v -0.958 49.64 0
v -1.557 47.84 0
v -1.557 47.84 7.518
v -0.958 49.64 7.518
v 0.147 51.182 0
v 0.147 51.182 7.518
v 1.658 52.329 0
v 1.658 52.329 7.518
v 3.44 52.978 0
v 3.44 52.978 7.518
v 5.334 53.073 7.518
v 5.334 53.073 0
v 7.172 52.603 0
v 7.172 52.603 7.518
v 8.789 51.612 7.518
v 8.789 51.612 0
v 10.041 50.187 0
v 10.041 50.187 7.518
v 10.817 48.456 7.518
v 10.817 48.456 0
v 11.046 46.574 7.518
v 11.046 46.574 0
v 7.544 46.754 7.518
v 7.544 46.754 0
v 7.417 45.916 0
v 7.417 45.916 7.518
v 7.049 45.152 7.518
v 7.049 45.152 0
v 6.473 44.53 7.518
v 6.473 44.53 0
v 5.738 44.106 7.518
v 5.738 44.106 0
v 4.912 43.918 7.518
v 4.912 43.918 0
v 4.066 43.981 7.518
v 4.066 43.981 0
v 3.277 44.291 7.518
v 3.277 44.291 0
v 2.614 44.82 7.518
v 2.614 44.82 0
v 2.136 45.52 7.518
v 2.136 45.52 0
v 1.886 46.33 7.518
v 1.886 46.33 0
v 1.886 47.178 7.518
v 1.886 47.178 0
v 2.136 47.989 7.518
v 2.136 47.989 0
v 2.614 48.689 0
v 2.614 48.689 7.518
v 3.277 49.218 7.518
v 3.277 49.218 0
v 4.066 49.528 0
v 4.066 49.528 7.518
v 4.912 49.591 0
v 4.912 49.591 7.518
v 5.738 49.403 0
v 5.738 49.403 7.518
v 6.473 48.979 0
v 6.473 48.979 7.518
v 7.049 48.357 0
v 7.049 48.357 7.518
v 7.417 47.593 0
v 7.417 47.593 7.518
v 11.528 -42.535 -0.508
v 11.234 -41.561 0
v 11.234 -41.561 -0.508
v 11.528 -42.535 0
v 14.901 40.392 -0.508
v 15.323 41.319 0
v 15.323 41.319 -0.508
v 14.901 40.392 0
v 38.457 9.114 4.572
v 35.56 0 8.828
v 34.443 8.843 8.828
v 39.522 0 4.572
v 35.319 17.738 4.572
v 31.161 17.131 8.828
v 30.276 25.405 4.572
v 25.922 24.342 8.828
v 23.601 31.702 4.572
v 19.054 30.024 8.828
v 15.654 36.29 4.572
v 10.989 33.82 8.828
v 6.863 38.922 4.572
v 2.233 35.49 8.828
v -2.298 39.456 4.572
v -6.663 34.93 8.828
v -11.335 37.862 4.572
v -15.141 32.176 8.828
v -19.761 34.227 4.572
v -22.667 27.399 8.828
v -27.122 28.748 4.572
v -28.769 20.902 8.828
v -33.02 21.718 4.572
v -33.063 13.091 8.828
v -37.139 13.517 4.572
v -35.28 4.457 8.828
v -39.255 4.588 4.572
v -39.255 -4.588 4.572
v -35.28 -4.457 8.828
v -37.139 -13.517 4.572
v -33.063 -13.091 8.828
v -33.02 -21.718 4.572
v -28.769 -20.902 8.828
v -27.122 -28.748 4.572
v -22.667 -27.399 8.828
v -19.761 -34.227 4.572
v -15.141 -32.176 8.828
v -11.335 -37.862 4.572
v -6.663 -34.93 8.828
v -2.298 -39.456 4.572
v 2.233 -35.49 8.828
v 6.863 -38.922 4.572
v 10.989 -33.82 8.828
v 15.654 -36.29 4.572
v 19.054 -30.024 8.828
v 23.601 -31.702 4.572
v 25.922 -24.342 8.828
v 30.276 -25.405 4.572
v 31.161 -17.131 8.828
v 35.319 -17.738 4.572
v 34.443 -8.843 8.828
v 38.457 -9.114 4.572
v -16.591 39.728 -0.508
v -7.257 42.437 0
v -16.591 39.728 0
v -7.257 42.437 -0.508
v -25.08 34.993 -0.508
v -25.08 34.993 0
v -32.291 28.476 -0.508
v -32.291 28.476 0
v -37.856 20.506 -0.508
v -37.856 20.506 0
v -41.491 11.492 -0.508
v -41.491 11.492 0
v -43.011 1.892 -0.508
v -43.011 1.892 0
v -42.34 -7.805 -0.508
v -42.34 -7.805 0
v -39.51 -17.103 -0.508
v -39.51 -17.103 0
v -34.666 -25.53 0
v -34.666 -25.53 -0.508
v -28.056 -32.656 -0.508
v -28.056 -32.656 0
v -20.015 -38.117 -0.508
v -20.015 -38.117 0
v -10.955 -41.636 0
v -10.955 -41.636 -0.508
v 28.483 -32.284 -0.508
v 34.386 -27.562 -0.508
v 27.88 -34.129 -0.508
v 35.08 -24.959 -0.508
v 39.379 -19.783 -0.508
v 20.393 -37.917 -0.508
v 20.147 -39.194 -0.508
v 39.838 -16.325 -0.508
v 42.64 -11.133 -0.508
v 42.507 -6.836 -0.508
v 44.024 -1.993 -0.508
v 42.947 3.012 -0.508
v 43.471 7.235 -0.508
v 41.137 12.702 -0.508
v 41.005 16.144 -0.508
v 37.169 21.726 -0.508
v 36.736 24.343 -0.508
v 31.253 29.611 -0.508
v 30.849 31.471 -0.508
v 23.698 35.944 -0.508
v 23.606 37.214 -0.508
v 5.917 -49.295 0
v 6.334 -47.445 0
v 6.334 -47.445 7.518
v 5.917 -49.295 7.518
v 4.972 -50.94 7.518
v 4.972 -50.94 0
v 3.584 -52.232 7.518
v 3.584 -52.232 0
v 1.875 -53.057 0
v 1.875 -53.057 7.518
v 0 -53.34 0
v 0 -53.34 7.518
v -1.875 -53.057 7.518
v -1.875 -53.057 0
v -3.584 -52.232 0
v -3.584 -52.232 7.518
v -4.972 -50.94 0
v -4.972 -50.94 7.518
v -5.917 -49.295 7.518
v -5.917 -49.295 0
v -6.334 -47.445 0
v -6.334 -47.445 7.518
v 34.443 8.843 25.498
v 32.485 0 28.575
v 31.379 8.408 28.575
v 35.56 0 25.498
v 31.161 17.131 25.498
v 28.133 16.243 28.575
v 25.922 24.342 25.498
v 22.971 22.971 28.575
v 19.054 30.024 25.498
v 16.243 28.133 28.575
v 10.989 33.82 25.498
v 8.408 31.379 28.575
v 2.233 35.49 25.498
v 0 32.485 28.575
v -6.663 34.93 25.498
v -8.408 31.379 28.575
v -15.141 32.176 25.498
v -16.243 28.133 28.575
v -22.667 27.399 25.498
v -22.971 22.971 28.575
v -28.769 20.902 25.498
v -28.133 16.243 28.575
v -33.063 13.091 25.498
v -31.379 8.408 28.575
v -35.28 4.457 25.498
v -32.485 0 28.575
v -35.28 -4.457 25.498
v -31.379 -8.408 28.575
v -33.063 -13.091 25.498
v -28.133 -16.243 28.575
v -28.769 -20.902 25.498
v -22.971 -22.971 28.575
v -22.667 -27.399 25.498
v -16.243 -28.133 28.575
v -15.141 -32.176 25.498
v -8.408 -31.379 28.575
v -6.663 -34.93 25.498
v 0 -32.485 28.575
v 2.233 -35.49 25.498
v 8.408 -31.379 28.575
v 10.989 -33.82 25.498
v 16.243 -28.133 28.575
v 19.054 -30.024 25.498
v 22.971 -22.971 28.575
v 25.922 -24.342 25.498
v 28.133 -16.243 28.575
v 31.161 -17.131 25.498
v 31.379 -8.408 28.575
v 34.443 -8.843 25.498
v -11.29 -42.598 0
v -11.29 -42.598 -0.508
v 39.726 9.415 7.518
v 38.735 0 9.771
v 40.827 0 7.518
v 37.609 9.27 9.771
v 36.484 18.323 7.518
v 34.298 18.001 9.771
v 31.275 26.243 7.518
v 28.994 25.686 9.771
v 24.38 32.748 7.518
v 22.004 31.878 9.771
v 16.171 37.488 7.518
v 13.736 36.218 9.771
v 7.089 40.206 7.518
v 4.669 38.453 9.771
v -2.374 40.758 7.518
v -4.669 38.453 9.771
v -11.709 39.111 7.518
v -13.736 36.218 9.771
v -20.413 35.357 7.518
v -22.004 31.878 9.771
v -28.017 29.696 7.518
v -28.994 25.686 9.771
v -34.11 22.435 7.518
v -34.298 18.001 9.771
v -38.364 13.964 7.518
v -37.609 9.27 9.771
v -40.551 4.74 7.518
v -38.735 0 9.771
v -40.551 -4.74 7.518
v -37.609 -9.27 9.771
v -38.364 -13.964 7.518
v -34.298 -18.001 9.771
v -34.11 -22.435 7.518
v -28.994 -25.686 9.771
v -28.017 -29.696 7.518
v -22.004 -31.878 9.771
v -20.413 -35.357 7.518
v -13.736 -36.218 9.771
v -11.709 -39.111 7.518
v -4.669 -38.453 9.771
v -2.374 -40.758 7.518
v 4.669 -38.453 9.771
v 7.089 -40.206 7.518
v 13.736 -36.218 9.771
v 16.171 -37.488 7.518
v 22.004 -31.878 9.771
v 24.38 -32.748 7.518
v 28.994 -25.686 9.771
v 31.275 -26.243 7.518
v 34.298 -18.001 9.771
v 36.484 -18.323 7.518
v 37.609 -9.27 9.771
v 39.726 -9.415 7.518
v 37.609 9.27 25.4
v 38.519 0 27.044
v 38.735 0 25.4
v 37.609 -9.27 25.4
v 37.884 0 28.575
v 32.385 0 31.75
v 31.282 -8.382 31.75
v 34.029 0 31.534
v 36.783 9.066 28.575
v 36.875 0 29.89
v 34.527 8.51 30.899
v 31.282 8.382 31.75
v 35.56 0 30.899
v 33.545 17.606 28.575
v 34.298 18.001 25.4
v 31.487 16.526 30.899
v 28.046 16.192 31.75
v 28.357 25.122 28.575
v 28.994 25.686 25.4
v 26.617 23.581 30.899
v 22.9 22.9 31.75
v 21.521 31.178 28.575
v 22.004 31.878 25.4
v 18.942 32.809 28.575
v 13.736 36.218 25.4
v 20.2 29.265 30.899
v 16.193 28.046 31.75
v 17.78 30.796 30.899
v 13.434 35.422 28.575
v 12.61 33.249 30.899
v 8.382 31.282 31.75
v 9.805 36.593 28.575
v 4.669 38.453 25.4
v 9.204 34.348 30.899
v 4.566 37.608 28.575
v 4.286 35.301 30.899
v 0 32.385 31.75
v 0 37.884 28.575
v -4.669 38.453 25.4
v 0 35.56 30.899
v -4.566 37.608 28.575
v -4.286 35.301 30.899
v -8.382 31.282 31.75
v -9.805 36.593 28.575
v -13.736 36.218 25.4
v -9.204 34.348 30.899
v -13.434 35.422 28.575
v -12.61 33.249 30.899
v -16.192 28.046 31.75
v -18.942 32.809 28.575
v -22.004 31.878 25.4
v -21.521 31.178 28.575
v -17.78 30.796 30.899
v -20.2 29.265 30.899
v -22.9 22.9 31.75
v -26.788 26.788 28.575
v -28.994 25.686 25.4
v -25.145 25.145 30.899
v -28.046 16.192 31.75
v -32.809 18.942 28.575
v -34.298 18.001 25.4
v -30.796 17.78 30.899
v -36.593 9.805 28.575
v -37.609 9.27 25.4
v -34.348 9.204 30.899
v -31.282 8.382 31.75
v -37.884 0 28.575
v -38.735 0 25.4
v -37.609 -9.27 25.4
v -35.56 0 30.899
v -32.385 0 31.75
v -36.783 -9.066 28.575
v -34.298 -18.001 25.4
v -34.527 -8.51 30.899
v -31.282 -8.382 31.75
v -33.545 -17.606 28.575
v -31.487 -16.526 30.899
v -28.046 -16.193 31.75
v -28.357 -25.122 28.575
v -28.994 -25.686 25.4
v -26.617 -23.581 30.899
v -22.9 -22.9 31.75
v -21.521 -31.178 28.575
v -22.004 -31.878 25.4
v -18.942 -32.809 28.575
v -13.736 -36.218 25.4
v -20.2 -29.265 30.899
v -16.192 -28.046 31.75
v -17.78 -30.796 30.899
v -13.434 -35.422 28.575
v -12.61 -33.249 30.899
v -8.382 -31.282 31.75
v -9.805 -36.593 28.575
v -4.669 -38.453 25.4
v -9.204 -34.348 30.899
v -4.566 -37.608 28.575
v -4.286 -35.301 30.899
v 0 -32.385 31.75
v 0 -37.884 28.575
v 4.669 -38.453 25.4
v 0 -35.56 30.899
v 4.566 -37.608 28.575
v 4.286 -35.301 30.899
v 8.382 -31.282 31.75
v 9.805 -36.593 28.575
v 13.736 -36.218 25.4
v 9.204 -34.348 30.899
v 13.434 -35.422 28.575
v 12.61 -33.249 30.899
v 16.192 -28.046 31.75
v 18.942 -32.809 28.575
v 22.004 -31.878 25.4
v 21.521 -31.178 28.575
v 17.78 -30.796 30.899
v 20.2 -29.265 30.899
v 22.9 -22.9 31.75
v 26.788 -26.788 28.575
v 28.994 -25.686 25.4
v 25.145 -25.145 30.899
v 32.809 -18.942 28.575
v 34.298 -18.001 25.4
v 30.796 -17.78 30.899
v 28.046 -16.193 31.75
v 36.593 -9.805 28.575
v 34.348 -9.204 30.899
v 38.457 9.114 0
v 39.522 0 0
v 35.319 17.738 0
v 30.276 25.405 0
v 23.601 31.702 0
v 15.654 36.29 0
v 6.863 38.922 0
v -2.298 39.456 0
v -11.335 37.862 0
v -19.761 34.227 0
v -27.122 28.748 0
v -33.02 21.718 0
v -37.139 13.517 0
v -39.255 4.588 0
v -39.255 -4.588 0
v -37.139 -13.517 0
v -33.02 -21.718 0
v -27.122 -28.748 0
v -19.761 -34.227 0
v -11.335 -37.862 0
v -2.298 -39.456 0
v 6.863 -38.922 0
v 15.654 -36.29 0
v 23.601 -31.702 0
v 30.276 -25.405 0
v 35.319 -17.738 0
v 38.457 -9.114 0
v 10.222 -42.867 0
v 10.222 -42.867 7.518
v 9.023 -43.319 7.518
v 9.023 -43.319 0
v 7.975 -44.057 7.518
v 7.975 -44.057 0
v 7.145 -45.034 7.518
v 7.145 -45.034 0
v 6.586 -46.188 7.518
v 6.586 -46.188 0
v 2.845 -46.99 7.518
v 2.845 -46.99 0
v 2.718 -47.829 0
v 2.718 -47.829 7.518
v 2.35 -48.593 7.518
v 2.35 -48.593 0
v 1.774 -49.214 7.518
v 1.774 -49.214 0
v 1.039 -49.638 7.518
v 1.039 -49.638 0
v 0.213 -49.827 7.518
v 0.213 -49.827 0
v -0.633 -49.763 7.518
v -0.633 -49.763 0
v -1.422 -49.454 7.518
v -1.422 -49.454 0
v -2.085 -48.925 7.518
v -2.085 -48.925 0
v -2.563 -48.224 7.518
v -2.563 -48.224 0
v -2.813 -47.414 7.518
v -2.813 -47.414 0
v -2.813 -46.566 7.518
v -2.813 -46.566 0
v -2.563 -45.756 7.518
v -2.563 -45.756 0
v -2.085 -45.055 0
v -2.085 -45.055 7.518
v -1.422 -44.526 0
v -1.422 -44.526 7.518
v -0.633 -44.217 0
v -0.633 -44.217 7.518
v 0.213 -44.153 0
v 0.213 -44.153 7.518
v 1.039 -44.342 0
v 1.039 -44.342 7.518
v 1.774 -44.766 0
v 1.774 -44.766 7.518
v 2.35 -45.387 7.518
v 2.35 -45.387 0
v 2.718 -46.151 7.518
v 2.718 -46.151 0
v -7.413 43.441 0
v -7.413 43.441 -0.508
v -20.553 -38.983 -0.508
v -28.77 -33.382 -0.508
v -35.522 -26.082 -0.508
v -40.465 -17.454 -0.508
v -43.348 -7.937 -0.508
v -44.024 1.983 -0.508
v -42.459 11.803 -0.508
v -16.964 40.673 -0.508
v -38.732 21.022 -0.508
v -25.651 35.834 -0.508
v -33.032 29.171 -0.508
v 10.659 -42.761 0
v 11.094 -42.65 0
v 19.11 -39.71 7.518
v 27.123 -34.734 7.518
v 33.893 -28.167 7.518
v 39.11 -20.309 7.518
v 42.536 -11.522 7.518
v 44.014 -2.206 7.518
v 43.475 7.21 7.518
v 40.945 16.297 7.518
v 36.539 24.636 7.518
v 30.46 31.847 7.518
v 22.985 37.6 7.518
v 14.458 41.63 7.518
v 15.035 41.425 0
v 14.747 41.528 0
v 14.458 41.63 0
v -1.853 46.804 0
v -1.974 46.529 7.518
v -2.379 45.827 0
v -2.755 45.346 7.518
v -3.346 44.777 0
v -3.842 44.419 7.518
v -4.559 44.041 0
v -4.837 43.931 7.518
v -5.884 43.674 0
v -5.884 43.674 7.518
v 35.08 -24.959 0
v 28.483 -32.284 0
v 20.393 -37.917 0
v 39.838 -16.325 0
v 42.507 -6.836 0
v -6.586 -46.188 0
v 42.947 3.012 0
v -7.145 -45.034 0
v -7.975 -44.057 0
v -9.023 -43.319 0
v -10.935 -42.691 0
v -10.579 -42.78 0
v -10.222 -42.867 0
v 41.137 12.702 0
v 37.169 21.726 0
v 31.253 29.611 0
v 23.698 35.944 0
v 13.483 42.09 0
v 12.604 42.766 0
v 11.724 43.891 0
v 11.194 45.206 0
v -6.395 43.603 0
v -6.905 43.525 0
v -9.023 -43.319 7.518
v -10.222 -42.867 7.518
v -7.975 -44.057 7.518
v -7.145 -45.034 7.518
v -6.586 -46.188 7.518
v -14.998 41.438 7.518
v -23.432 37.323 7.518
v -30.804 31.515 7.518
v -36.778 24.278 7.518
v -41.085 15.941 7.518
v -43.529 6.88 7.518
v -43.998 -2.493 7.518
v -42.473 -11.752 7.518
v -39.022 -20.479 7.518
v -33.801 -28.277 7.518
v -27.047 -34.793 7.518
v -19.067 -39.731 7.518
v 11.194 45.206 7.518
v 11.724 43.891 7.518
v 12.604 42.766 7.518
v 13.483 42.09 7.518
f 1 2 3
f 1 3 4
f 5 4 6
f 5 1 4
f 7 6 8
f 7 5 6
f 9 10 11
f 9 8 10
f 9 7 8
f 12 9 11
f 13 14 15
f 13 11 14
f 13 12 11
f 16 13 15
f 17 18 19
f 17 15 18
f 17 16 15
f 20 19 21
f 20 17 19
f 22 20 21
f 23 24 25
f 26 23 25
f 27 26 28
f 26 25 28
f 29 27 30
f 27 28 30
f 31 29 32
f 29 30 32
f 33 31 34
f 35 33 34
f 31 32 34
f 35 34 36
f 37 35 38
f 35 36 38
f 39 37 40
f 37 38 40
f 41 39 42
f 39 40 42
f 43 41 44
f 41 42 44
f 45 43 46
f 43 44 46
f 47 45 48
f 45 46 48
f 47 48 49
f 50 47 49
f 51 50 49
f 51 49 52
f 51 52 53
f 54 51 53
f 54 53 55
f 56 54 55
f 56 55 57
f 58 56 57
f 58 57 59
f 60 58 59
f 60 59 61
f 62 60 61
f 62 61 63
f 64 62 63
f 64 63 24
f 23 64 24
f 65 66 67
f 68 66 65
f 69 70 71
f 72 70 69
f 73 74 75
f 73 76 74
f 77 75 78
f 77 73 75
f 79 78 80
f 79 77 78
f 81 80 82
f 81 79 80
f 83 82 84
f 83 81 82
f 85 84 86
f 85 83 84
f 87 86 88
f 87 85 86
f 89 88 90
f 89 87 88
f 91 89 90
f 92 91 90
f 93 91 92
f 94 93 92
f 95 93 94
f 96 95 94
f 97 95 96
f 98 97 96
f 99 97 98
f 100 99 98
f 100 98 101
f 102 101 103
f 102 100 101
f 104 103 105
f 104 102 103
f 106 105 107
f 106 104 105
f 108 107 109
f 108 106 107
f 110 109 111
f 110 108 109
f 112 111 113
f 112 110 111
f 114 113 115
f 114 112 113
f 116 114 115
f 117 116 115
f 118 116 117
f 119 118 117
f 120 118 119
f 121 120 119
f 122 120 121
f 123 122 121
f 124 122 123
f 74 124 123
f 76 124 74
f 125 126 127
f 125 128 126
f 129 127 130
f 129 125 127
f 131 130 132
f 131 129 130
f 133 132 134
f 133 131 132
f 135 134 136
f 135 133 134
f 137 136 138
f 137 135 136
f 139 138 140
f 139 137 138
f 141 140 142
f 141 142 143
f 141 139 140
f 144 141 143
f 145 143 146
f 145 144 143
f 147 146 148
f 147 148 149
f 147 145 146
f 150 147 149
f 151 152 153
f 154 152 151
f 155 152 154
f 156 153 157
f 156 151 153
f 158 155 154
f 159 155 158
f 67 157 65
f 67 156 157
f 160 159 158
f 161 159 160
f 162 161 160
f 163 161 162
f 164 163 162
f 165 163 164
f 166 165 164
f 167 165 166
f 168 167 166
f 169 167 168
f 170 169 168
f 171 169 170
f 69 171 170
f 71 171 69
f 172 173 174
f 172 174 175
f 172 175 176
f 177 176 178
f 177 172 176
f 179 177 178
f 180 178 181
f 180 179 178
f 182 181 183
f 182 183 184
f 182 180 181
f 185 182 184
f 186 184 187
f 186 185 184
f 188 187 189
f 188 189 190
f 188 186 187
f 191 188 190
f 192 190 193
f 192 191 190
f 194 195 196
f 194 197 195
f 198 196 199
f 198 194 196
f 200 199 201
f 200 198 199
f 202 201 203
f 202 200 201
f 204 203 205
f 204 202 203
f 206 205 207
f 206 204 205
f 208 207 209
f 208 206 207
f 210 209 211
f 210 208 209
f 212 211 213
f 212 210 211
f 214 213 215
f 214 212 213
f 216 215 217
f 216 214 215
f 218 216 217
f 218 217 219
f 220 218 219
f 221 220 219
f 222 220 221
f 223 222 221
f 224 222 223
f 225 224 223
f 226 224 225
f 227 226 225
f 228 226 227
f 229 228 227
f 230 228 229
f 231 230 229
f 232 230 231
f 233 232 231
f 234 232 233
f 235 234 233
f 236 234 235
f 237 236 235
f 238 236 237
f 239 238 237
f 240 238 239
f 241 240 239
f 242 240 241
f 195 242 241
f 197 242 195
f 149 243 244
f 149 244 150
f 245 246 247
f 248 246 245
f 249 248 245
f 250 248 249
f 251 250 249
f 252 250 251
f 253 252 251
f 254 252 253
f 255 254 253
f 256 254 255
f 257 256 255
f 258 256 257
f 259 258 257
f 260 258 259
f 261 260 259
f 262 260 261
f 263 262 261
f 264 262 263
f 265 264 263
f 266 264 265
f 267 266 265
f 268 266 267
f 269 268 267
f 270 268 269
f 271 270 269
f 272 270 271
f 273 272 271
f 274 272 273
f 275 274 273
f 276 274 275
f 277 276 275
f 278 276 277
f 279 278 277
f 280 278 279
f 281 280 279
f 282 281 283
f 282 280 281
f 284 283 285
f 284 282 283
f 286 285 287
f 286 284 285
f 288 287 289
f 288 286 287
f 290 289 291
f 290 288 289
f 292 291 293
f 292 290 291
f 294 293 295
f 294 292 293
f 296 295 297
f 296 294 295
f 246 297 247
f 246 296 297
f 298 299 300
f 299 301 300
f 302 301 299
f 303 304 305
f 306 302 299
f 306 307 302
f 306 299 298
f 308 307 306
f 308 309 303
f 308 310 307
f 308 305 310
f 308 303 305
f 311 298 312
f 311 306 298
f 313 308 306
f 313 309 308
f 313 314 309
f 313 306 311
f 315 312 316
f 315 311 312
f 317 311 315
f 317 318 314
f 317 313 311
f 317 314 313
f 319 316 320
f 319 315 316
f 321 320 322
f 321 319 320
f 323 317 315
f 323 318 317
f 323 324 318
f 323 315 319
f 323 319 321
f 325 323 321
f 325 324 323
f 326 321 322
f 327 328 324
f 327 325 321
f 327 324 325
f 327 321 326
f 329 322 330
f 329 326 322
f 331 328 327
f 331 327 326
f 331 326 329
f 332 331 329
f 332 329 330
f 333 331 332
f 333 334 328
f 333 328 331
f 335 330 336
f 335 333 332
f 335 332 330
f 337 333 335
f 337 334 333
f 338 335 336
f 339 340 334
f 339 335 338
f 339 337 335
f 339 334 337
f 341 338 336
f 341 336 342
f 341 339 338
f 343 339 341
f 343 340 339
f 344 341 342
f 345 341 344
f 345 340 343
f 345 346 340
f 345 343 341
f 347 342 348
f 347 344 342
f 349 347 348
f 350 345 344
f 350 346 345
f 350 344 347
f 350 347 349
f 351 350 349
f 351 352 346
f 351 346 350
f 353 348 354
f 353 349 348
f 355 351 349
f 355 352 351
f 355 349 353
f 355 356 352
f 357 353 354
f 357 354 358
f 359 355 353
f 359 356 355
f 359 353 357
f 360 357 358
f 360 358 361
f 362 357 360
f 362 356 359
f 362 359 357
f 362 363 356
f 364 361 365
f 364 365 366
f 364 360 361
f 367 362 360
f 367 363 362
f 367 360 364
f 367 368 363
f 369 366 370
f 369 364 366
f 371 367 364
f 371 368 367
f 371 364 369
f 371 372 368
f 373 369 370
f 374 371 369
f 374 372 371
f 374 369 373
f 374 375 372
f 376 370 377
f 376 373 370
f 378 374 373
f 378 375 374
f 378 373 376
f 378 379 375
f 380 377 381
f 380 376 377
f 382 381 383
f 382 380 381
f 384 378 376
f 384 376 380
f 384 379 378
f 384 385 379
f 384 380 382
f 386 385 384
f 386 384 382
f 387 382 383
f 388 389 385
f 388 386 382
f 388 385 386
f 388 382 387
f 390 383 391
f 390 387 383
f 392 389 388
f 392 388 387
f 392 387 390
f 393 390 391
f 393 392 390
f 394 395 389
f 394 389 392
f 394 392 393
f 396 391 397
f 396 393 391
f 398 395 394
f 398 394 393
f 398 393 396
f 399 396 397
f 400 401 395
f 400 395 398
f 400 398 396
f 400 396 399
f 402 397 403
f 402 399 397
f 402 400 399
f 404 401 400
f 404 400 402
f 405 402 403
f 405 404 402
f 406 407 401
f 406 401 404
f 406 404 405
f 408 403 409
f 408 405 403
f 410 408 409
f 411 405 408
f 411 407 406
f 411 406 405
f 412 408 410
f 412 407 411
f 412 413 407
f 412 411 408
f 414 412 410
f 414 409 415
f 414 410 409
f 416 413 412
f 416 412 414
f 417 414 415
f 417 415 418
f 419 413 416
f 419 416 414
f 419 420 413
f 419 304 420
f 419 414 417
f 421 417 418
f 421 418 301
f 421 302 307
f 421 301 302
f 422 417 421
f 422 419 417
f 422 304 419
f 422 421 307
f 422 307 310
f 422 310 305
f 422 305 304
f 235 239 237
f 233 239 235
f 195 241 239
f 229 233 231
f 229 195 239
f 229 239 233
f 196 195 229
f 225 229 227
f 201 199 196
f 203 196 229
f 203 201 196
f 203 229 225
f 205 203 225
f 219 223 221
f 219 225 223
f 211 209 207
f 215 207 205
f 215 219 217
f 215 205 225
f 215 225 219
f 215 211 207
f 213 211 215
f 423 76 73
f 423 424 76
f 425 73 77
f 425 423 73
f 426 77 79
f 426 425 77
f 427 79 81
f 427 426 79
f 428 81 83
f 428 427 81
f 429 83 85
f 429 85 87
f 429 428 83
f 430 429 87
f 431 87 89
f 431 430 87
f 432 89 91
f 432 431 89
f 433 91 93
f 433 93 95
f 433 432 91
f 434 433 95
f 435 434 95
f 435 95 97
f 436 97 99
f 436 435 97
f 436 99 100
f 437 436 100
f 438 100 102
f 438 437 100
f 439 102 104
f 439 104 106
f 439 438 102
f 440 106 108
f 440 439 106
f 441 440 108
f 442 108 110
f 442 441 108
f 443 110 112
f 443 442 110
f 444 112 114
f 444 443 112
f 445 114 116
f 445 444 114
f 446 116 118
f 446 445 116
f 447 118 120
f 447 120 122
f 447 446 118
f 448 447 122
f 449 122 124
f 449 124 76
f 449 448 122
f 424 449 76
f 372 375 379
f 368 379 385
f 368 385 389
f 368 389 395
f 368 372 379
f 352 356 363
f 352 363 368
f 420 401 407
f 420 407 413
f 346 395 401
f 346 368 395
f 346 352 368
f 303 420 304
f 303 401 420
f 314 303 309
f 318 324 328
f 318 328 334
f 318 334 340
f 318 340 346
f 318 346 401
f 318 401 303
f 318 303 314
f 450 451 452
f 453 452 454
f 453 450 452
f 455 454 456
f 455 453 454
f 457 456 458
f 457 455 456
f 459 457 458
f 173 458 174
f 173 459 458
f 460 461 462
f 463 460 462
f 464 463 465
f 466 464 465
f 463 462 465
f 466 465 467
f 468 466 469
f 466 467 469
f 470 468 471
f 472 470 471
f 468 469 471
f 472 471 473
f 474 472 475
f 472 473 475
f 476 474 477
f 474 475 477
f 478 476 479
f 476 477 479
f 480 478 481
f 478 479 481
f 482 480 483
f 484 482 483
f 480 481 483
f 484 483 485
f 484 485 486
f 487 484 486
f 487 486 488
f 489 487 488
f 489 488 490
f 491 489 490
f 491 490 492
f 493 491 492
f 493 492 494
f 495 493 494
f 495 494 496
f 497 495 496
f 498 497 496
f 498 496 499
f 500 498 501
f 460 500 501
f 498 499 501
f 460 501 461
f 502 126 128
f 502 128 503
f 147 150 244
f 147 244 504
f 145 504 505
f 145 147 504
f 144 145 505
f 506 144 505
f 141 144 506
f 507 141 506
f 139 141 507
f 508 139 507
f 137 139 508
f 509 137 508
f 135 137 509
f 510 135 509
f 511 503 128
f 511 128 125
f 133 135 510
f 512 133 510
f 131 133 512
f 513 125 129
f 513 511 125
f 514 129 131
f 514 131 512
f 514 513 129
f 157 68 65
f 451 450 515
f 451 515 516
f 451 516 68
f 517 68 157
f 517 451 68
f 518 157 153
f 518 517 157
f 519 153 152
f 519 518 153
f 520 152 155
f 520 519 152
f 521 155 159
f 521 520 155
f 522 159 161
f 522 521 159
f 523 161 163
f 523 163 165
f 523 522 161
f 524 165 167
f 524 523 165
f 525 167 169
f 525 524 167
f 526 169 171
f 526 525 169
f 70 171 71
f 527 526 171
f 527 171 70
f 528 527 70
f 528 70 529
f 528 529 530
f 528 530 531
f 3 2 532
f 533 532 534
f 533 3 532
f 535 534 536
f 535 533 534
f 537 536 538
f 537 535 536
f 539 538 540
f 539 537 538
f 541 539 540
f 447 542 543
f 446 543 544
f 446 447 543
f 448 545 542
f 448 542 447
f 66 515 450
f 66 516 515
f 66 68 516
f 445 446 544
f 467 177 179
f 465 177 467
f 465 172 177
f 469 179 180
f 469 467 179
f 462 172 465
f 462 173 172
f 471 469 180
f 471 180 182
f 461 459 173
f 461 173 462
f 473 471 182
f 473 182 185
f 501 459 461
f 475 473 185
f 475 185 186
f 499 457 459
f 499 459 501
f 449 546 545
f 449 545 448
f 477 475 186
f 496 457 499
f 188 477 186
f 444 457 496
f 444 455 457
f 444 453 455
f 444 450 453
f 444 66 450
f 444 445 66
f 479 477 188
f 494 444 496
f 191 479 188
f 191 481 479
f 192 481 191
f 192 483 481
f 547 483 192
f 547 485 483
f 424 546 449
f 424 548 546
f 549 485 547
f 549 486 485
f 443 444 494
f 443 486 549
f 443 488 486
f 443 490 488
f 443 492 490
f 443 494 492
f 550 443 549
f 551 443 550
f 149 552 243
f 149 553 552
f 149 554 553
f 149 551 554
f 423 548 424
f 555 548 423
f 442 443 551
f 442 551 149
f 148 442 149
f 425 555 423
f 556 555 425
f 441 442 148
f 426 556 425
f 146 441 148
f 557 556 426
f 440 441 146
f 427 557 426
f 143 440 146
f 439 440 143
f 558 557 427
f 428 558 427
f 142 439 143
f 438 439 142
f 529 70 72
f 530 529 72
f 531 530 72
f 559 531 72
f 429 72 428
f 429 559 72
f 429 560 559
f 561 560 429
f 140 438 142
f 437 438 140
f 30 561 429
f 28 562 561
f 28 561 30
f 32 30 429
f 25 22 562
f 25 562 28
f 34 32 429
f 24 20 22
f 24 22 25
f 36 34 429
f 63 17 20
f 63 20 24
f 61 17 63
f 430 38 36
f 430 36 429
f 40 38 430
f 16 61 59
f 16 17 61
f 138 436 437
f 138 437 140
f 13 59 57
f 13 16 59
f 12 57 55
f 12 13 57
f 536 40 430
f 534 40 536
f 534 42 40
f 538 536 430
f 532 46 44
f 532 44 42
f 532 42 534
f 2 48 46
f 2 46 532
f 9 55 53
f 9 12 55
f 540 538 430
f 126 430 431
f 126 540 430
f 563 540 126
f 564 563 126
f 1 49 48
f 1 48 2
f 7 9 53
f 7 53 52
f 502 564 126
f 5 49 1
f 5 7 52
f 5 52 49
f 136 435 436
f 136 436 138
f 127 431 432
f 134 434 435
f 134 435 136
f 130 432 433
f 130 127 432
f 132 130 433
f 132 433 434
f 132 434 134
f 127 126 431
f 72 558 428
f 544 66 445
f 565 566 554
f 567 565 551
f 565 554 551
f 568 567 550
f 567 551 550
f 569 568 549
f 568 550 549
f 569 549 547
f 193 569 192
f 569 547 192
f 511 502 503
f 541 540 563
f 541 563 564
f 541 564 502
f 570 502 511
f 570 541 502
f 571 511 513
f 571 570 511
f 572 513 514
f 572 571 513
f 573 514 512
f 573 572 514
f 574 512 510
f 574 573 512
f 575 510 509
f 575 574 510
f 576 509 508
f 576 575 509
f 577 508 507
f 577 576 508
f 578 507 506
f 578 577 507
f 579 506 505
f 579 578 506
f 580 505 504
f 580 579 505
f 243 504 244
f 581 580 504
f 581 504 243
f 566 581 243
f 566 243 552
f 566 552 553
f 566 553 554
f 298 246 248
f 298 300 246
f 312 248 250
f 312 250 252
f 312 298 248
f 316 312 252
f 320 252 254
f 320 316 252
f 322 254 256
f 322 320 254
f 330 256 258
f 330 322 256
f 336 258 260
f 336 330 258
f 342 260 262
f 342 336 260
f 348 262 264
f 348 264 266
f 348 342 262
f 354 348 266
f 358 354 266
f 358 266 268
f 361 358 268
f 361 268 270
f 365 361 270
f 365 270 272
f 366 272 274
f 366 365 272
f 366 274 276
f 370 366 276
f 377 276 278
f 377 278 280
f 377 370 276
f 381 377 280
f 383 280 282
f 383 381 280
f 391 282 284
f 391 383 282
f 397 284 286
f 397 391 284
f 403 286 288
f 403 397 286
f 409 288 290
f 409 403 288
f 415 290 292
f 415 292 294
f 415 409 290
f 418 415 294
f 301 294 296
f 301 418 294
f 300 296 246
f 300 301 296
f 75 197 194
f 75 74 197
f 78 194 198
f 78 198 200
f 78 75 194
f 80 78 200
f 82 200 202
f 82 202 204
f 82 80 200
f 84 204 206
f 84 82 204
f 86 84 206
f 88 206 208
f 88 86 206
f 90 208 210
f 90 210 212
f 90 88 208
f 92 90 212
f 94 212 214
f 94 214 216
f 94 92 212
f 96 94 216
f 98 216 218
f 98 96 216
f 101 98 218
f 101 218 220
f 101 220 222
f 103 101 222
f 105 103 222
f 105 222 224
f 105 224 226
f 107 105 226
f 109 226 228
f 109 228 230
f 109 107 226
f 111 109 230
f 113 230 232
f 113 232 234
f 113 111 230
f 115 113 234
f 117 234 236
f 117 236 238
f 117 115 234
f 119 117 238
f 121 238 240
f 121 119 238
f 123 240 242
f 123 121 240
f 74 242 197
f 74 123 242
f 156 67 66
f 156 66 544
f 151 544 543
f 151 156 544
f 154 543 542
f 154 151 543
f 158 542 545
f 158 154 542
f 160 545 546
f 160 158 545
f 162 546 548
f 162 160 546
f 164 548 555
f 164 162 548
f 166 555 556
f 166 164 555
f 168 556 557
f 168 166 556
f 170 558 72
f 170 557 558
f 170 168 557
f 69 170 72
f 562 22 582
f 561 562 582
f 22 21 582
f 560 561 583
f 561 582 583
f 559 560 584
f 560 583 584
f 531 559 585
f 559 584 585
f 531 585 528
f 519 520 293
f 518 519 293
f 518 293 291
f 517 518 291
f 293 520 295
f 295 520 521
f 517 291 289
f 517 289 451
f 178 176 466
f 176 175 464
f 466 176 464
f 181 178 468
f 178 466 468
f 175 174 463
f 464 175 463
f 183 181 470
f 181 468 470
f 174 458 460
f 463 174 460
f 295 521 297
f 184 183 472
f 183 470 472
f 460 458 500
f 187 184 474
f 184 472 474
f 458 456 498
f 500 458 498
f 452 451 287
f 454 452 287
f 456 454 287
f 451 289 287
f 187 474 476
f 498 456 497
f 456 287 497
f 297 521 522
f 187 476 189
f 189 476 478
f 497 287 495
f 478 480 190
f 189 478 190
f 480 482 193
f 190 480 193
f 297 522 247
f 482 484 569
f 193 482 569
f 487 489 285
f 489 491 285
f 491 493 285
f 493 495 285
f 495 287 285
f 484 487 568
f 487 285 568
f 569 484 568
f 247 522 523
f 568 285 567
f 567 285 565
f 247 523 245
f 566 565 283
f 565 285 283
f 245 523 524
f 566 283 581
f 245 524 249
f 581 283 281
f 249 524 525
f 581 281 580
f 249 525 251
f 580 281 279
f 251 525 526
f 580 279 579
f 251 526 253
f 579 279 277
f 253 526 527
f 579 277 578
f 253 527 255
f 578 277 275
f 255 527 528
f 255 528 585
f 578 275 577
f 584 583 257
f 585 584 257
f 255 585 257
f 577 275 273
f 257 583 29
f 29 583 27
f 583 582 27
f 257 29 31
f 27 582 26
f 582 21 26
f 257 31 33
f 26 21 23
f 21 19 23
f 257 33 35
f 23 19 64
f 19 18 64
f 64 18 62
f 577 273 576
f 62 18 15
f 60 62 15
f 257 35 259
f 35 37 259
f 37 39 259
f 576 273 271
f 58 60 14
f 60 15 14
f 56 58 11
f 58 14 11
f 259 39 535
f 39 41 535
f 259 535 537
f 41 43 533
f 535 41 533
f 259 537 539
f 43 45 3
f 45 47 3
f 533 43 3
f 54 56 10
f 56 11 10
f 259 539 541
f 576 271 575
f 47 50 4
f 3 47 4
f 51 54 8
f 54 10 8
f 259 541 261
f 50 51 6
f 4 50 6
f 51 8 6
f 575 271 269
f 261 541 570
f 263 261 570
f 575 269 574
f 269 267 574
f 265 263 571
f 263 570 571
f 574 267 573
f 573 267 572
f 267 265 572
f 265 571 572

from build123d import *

# Parameters (mm, degrees)
F2_R        = 2.8448
F3_DEPTH    = 7.5184
F2_R_2      = 6.35
F4_DEPTH    = 7.5184
F5_R        = 5.08
F6_T1_DEPTH = 7.5184
F9_DEPTH    = 0.508


# Not quite as in the source:
# - a fillet or chamfer that OpenCascade refuses, or shapes differently, is made with other operations: its cross-section is extruded or revolved along the edge and cut away or added
# - two fillets or chamfers of one size are made in one step


with BuildPart() as f1:
    # F0 (on Front) → F1 (revolve)
    with BuildSketch(Plane.XZ):
        with BuildLine():
            Line((32.385, 31.75), (0, 31.75))
            Line((0, 31.75), (0, 28.575))
            Line((0, 28.575), (32.4854701757, 28.575))
            Line((32.4854701757, 28.575), (35.56, 25.49819462))
            Line((35.56, 25.49819462), (35.56, 8.8277412578))
            Line((35.56, 8.8277412578), (39.5224, 4.572))
            Line((39.5224, 4.572), (39.5224, 0))
            Line((39.5224, 0), (43.053, 0))
            Line((43.053, 0), (43.053, -0.508))
            Line((43.053, -0.508), (44.069, -0.508))
            Line((44.069, -0.508), (44.069, 7.5184))
            Line((44.069, 7.5184), (40.8266418362, 7.5184))
            Line((40.8266418362, 7.5184), (38.735, 9.7710676491))
            Line((38.735, 9.7710676491), (38.735, 25.4))
            ThreePointArc((38.735, 25.4), (36.8751280605, 29.8901280605), (32.385, 31.75))
        make_face()
    revolve(axis=Axis((0, 0, 30.1625), (0, 0, 1)))

    # F2 (on face) → F3 (join)
    with BuildSketch(Plane(origin=(0, 0, 0), x_dir=(1, 0, 0), z_dir=(0, 0, -1))):
        with BuildLine():
            ThreePointArc((4.7616218936, 42.7888743243), (5.939646413, 44.7443151405), (6.35, 46.99))
            ThreePointArc((6.35, 46.99), (-2.2456848595, 52.929646413), (-4.7616218936, 42.7888743243))
            ThreePointArc((-4.7616218936, 42.7888743243), (0, 43.053), (4.7616218936, 42.7888743243))
        make_face()
        with Locations((0, 46.99)):
            Circle(F2_R, mode=Mode.SUBTRACT)
    extrude(amount=-F3_DEPTH)

    # F2 (on face) → F4 (join)
    with BuildSketch(Plane(origin=(0, 0, 0), x_dir=(1, 0, 0), z_dir=(0, 0, -1))):
        with Locations((0, 46.99)):
            Circle(F2_R_2)
        with Locations((0, 46.99)):
            Circle(F2_R, mode=Mode.SUBTRACT)
        with Locations((4.699, -46.7544596696)):
            Circle(F2_R_2)
        with Locations((4.699, -46.7544596696)):
            Circle(F2_R, mode=Mode.SUBTRACT)
    extrude(amount=-F4_DEPTH)

    # F5
    f5_edges = [f1.edges().sort_by_distance(p)[0] for p in [
        (9.795498, 42.966557, 3.7592),
        (-1.049351, 44.056505, 3.7592),
    ]]
    fillet(f5_edges, radius=F5_R)

    # F6: fillet of radius 5.08 on 2 edges, made by hand

    # F6_s2 → F6_t1 (join)
    with BuildSketch(Plane.XY):
        with BuildLine():
            ThreePointArc((10.2222959919, -42.8670202563), (7.5289917798, -44.5196041815), (6.3336992457, -47.444701952))
            ThreePointArc((6.3336992457, -47.444701952), (6.1774395627, -45.5197141608), (5.4497416206, -43.7307337838))
            ThreePointArc((5.4497416206, -43.7307337838), (7.8479099763, -43.3645831296), (10.2222959919, -42.8670202563))
        make_face()
        with BuildLine():
            ThreePointArc((-10.2222959919, -42.8670202563), (-7.5289917798, -44.5196041815), (-6.3336992457, -47.444701952))
            ThreePointArc((-6.3336992457, -47.444701952), (-6.1774395627, -45.5197141608), (-5.4497416206, -43.7307337838))
            ThreePointArc((-5.4497416206, -43.7307337838), (-7.8479099763, -43.3645831296), (-10.2222959919, -42.8670202563))
        make_face()
    extrude(amount=F6_T1_DEPTH)

    # F8 (on face) → F9 (cut)
    with BuildSketch(Plane(origin=(0, 0, 0), x_dir=(1, 0, 0), z_dir=(0, 0, -1))):
        with BuildLine():
            Line((11.2232032022, 41.5248573346), (11.5476018718, 42.6009083999))
            ThreePointArc((11.5476018718, 42.6009083999), (0.1217283712, 44.1331880413), (-11.3123981282, 42.6637604833))
            Line((-11.3123981282, 42.6637604833), (-10.9422300011, 41.5995270014))
            ThreePointArc((-10.9422300011, 41.5995270014), (0.145362907, 43.0097069155), (11.2232032022, 41.5248573346))
        make_face()
        with BuildLine():
            Line((-7.2390749119, -42.3223562539), (-7.4246343474, -43.5135134363))
            ThreePointArc((-7.4246343474, -43.5135134363), (4.1004463869, -43.9625847646), (15.3315616772, -41.3374751806))
            Line((15.3315616772, -41.3374751806), (14.8499479477, -40.2801455114))
            ThreePointArc((14.8499479477, -40.2801455114), (3.9400511762, -42.757274104), (-7.2390749119, -42.3223562539))
        make_face()
    extrude(amount=F9_DEPTH, mode=Mode.SUBTRACT)


solid = f1.part
